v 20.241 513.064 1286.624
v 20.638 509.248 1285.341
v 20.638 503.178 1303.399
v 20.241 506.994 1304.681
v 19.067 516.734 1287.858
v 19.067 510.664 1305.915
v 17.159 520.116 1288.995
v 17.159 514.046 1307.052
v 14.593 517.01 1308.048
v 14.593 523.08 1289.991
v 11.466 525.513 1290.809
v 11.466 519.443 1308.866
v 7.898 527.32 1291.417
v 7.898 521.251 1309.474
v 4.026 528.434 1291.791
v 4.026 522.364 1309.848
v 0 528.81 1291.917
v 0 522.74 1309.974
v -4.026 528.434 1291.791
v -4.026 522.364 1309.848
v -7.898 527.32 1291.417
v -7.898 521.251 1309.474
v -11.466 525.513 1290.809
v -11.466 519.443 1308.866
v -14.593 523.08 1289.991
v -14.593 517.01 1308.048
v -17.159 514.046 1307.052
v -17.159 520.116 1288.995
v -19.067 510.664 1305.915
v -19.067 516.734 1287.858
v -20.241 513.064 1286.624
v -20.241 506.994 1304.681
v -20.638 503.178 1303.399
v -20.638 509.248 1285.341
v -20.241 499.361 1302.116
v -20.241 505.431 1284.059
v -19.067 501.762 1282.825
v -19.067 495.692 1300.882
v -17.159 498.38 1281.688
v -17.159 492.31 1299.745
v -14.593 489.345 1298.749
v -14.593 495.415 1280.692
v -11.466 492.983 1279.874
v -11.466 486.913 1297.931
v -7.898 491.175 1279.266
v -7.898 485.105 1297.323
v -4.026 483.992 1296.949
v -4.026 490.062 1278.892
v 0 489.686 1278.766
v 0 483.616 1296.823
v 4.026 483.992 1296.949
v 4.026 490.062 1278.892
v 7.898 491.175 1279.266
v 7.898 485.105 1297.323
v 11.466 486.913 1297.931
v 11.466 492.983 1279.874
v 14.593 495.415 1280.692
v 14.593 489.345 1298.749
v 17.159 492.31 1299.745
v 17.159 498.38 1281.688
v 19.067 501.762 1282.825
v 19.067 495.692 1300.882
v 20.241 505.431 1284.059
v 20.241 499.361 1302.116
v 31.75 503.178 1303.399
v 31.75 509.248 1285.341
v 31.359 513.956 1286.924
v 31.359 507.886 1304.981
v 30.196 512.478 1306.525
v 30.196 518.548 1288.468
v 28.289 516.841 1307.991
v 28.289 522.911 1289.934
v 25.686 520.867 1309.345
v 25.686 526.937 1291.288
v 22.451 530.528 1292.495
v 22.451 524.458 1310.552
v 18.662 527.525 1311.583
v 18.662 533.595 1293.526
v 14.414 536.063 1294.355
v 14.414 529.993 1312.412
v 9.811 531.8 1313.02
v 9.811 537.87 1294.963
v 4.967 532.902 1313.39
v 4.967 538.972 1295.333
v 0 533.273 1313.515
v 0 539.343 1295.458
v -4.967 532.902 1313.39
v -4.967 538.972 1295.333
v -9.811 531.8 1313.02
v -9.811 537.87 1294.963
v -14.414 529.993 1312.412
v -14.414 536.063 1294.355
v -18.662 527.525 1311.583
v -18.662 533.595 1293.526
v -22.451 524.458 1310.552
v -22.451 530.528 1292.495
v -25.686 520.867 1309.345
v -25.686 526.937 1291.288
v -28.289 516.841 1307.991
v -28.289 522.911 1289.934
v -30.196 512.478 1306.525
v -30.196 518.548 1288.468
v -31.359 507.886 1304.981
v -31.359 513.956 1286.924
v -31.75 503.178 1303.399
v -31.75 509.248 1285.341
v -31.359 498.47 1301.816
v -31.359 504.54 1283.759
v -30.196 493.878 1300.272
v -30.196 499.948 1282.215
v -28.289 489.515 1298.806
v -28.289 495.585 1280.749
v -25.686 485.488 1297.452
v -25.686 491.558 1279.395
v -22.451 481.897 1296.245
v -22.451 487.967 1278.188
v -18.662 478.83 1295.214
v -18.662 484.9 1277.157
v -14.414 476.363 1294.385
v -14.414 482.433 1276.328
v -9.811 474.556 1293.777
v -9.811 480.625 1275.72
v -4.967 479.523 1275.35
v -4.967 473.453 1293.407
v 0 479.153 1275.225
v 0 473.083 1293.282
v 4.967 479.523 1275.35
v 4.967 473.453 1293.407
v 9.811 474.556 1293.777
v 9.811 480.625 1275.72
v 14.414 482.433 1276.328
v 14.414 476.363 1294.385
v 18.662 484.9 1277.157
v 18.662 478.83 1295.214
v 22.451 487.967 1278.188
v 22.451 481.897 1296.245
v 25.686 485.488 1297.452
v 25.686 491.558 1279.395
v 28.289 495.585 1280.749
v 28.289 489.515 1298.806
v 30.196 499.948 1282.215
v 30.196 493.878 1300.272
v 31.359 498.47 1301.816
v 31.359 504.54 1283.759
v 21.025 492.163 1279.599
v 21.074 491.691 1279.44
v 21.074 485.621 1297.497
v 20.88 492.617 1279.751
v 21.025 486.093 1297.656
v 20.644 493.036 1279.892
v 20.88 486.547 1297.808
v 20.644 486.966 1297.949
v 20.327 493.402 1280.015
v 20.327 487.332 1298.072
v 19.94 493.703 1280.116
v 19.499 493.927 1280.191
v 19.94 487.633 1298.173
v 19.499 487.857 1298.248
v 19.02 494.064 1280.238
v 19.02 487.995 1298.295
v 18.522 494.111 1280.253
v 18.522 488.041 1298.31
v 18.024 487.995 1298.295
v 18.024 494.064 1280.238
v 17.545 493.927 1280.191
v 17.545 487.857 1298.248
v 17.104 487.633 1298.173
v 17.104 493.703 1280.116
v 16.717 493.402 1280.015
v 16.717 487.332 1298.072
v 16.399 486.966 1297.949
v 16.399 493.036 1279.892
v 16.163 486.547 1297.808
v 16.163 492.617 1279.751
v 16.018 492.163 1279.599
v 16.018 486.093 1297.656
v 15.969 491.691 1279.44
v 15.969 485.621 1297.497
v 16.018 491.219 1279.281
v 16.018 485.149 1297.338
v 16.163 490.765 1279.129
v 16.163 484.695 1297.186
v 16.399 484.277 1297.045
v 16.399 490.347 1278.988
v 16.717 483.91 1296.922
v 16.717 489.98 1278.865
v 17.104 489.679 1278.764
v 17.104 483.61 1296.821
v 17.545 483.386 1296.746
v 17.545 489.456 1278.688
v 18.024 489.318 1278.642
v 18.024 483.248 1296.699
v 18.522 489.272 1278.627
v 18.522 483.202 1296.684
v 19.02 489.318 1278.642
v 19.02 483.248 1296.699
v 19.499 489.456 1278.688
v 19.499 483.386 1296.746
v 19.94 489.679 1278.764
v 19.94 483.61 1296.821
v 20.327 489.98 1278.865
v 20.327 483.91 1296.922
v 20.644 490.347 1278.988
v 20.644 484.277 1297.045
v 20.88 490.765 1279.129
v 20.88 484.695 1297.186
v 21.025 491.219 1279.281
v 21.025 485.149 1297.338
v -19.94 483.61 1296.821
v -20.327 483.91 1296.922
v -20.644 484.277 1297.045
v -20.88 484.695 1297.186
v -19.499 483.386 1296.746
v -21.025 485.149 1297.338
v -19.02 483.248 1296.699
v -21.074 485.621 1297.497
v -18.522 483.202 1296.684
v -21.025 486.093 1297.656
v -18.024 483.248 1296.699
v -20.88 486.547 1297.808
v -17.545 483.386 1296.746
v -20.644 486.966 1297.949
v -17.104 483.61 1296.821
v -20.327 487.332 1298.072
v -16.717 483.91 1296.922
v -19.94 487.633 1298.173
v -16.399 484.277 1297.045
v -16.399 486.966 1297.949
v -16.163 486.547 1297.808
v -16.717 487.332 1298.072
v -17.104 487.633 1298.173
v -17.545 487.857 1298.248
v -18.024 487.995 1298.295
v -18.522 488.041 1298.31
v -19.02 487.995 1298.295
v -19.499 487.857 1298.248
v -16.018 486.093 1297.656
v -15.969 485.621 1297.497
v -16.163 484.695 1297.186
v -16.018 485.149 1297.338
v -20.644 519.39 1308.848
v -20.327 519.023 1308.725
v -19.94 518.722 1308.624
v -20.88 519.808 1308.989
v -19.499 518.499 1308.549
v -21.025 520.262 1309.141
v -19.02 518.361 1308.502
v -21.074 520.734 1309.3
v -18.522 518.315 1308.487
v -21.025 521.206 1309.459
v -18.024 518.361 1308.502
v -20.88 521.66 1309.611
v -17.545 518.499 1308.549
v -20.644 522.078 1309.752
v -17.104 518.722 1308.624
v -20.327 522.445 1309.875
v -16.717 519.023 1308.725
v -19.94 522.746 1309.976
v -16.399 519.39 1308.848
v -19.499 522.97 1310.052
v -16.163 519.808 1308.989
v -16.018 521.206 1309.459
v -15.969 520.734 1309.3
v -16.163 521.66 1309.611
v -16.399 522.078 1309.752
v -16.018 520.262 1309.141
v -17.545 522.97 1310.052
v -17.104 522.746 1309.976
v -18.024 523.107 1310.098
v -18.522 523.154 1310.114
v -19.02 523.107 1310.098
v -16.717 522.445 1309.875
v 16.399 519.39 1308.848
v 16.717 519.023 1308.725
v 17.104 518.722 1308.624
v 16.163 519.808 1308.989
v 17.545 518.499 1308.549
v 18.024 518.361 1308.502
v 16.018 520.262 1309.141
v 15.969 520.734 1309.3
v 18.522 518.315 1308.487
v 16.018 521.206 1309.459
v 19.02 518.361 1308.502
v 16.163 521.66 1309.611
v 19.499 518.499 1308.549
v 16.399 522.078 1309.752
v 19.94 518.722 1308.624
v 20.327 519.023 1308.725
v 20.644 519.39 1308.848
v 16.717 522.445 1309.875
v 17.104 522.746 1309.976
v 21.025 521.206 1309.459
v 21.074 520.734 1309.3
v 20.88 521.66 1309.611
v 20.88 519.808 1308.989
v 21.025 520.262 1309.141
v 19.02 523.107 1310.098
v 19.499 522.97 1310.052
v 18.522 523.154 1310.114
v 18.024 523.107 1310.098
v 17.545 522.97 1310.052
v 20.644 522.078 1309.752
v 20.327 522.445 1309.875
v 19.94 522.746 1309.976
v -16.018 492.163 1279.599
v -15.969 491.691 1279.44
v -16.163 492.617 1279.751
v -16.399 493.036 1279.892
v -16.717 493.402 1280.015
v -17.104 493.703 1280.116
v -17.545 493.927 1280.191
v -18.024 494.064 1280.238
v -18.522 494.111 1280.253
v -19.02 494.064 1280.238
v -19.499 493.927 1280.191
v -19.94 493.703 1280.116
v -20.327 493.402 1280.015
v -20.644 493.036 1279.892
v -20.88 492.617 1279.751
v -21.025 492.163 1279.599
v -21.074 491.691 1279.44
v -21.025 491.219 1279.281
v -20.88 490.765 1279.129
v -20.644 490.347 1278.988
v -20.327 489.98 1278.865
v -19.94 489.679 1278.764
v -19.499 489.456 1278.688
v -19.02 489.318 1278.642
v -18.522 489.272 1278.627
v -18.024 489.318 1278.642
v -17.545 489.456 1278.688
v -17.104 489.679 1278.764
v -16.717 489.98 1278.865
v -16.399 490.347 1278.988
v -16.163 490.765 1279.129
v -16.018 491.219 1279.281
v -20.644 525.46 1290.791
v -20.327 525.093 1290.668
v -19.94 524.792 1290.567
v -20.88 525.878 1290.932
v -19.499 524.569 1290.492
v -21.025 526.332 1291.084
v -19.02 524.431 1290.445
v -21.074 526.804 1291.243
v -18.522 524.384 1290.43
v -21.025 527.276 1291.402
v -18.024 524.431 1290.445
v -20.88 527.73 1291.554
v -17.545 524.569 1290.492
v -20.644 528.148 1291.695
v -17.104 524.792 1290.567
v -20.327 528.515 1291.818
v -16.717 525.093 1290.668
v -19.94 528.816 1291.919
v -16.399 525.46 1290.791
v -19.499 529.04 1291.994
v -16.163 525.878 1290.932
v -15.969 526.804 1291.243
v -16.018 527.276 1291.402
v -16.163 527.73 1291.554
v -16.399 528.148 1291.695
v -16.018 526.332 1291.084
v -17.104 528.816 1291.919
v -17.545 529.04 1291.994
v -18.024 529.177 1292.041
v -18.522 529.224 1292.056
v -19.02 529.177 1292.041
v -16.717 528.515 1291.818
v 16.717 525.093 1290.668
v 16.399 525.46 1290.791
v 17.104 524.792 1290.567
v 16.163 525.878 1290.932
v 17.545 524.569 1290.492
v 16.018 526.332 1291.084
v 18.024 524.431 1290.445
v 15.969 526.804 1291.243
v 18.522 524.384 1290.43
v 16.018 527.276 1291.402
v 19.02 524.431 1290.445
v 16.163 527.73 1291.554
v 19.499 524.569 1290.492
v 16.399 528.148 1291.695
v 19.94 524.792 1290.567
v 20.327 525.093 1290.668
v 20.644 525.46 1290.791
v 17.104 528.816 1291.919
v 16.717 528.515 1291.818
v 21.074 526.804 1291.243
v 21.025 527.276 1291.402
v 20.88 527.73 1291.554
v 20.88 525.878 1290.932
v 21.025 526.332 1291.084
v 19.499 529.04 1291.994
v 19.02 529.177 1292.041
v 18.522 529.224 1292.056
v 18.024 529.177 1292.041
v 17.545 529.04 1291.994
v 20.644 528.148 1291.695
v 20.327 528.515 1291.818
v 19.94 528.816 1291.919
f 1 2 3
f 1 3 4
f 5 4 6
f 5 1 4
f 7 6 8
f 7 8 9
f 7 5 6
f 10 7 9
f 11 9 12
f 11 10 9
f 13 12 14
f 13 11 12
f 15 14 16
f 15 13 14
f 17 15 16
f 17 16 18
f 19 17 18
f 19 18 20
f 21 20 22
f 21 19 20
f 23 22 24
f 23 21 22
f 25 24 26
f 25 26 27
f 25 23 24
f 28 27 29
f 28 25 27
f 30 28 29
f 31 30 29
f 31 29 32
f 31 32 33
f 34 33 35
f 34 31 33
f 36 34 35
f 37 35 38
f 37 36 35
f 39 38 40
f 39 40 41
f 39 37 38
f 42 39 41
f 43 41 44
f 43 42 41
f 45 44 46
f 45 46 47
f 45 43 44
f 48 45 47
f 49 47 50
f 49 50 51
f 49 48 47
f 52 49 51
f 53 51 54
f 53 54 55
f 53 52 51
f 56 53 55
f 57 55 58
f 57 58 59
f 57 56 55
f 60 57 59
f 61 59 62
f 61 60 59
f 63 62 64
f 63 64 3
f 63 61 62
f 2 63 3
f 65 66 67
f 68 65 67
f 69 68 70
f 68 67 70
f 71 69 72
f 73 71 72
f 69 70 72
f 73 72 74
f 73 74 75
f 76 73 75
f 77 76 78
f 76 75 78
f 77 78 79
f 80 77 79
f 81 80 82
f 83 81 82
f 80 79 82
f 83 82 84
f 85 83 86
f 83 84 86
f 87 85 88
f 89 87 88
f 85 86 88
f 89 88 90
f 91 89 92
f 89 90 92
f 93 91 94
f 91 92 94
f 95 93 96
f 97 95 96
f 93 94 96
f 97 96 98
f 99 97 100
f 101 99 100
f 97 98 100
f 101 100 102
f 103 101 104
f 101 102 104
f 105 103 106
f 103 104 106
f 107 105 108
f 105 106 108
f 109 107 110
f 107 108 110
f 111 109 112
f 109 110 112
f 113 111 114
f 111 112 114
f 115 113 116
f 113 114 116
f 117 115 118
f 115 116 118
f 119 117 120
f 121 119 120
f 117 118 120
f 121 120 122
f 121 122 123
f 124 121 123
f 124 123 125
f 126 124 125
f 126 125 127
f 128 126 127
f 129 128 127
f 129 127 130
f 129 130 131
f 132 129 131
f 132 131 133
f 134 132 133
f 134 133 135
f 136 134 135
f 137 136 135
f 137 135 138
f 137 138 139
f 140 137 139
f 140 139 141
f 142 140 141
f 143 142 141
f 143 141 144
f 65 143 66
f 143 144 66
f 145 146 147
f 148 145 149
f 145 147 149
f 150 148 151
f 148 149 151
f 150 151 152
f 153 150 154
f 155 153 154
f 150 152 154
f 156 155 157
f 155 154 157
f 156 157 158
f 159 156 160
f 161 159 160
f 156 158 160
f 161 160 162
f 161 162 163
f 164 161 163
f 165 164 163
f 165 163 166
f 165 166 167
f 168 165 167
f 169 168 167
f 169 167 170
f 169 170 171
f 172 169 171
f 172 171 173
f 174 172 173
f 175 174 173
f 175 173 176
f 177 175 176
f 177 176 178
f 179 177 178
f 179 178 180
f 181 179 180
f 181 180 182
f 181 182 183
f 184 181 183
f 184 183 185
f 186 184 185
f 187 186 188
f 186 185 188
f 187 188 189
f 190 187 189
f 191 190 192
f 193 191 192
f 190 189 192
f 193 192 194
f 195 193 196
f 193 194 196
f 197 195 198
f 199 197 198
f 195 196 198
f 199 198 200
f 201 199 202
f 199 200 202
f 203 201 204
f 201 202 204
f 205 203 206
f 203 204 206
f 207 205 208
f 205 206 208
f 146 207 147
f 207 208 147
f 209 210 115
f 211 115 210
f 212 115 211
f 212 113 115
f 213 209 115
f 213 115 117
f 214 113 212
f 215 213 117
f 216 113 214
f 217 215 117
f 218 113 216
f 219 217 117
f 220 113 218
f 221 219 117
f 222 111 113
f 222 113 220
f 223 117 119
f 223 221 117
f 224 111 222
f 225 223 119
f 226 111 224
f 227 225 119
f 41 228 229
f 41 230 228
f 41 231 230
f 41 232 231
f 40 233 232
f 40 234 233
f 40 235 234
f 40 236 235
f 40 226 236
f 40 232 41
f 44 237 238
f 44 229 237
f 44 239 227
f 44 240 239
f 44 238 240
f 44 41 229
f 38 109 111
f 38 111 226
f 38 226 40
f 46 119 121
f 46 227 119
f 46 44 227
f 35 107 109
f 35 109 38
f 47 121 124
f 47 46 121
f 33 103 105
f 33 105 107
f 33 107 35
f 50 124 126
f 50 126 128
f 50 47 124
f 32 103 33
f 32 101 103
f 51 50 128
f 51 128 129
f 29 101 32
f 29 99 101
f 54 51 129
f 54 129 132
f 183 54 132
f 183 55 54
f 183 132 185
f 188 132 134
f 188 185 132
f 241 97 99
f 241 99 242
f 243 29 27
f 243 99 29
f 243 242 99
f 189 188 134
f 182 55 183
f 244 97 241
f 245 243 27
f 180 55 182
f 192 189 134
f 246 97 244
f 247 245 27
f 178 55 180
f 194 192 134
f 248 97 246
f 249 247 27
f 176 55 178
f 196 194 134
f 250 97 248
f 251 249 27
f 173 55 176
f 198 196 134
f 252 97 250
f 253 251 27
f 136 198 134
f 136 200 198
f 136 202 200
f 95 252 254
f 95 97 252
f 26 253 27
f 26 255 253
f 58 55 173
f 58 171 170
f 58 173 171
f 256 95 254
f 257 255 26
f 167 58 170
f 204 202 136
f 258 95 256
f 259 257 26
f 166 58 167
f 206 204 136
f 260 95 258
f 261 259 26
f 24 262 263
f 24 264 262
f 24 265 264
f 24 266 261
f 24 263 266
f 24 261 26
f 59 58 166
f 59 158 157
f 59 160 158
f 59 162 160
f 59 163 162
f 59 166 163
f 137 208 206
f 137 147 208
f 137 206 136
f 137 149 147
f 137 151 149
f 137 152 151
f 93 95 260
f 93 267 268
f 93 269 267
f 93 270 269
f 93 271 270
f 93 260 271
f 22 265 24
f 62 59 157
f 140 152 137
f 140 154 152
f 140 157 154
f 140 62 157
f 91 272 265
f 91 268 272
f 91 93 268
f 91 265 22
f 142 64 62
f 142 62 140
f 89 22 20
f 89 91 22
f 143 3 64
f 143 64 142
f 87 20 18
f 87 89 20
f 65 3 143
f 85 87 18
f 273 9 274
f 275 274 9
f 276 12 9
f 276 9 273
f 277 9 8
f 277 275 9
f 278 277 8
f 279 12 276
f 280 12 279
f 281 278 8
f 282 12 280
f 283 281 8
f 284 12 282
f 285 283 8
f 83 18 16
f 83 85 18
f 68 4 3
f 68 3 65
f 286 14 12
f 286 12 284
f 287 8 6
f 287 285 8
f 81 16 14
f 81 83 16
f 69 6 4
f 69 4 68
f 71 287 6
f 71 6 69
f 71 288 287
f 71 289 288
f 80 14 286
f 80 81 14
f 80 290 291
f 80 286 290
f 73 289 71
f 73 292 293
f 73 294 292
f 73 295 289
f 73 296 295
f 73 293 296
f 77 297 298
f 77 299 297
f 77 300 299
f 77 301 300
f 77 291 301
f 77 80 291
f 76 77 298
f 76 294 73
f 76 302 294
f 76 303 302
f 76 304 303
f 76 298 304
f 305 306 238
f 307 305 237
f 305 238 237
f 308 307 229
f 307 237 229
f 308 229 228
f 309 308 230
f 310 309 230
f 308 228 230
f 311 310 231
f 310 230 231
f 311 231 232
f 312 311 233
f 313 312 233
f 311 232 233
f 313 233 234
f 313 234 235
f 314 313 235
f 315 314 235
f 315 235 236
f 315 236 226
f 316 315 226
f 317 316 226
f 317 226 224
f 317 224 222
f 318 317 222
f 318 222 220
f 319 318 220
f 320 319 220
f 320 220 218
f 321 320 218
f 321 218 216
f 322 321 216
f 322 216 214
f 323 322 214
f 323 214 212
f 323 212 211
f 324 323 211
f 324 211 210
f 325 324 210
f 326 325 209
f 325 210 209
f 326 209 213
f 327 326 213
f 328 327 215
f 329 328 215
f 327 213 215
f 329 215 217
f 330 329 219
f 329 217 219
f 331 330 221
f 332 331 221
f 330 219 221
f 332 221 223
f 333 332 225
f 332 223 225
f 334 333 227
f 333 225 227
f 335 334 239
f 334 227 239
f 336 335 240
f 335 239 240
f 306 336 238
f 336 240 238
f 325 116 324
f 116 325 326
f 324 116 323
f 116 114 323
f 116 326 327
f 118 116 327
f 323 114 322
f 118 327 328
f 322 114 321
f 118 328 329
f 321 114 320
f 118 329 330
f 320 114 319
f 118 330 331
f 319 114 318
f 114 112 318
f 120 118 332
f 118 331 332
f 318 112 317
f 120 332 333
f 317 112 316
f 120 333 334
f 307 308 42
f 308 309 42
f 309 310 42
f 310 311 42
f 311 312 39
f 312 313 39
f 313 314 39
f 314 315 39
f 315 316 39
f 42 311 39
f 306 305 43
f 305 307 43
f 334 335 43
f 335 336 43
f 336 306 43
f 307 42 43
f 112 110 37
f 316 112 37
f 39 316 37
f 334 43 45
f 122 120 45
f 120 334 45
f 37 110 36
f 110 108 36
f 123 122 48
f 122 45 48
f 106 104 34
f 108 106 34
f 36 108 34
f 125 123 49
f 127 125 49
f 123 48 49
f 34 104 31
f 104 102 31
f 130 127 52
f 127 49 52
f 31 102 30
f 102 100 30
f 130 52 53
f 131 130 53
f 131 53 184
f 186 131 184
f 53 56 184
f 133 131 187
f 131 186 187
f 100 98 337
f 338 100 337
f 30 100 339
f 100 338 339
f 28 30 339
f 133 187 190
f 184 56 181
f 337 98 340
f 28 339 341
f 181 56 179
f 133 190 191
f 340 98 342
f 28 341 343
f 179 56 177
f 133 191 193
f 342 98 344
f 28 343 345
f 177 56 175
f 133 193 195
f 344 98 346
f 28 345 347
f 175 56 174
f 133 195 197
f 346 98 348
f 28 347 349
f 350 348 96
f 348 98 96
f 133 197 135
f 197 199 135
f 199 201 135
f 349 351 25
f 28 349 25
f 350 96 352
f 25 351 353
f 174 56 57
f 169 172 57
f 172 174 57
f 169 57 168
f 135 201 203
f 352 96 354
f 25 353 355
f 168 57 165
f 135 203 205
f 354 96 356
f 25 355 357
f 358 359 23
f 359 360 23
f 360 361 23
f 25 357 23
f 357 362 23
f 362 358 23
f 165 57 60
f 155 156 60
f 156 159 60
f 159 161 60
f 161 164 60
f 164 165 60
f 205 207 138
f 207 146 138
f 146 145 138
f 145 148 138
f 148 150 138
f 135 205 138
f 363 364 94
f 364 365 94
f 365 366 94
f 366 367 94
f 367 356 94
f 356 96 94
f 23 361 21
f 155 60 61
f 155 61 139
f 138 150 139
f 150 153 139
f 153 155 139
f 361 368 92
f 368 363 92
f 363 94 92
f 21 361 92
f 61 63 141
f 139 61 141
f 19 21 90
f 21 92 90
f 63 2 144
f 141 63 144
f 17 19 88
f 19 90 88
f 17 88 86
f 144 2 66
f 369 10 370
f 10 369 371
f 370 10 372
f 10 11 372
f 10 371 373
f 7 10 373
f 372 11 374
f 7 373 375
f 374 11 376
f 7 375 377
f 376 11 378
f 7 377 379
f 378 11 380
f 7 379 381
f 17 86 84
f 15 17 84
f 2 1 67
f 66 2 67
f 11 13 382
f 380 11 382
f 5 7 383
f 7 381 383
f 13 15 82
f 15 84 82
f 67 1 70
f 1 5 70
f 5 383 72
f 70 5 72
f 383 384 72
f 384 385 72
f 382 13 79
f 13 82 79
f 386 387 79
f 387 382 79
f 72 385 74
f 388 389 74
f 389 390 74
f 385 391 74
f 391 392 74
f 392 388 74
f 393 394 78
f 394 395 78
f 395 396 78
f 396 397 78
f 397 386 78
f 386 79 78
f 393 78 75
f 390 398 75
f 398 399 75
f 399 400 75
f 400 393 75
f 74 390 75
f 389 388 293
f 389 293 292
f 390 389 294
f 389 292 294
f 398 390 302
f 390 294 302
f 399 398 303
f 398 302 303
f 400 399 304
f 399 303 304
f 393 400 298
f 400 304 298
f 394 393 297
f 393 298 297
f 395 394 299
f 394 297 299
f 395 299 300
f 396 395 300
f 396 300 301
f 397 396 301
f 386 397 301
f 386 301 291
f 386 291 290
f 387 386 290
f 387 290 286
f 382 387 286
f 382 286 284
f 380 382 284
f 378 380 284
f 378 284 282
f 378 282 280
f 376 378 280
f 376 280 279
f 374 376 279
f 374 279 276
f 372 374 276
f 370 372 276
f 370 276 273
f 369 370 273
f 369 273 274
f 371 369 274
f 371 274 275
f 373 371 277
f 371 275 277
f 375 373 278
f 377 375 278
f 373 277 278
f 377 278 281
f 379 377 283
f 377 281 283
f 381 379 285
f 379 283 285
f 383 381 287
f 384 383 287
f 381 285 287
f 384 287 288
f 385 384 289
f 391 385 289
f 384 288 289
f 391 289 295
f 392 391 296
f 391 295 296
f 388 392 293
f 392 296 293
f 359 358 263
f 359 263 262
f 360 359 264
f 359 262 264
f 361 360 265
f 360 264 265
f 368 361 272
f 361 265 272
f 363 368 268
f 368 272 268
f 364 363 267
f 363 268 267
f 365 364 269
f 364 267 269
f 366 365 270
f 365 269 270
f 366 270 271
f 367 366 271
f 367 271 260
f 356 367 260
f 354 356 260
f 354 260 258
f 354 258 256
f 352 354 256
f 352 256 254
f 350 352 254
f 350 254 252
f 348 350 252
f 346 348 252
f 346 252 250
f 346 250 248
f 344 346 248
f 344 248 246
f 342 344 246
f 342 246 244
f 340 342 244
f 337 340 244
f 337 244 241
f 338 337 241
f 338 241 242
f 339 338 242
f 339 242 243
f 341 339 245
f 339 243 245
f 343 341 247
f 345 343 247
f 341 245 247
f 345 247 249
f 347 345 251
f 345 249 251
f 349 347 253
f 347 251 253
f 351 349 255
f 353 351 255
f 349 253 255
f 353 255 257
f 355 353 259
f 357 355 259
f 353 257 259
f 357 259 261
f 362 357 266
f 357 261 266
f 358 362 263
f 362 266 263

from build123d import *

# Parameters (mm, degrees)
SKETCH1_R               = 31.75
SKETCH1_R_2             = 20.6375
BOSS_EXTRUDE1_DEPTH     = 19.05
F_1_4_20_TAPPED_HOLE1_D = 5.1054


with BuildPart() as part:
    # Sketch1 → Boss-Extrude1 (new body)
    with BuildSketch(Plane(origin=(0, -336.500449063, 1001.043483969), x_dir=(1, 0, 0), z_dir=(0, -0.318629355, 0.947879388))):
        with Locations((0, 892.252904457)):
            Circle(SKETCH1_R)
        with Locations((0, 892.252904457)):
            Circle(SKETCH1_R_2, mode=Mode.SUBTRACT)
    extrude(amount=BOSS_EXTRUDE1_DEPTH)

    # 1/4-20 Tapped Hole1 (through all)
    with Locations(Plane(origin=(0, -336.500449063, 1001.043483969), x_dir=(-1, 0, 0), z_dir=(0, 0.318629355, -0.947879388))):
        with Locations((18.52177825, 910.774682707), (-18.52177825, 910.774682707), (-18.52177825, 873.731126207), (18.52177825, 873.731126207)):
            Hole(F_1_4_20_TAPPED_HOLE1_D / 2)


solid = part.part
